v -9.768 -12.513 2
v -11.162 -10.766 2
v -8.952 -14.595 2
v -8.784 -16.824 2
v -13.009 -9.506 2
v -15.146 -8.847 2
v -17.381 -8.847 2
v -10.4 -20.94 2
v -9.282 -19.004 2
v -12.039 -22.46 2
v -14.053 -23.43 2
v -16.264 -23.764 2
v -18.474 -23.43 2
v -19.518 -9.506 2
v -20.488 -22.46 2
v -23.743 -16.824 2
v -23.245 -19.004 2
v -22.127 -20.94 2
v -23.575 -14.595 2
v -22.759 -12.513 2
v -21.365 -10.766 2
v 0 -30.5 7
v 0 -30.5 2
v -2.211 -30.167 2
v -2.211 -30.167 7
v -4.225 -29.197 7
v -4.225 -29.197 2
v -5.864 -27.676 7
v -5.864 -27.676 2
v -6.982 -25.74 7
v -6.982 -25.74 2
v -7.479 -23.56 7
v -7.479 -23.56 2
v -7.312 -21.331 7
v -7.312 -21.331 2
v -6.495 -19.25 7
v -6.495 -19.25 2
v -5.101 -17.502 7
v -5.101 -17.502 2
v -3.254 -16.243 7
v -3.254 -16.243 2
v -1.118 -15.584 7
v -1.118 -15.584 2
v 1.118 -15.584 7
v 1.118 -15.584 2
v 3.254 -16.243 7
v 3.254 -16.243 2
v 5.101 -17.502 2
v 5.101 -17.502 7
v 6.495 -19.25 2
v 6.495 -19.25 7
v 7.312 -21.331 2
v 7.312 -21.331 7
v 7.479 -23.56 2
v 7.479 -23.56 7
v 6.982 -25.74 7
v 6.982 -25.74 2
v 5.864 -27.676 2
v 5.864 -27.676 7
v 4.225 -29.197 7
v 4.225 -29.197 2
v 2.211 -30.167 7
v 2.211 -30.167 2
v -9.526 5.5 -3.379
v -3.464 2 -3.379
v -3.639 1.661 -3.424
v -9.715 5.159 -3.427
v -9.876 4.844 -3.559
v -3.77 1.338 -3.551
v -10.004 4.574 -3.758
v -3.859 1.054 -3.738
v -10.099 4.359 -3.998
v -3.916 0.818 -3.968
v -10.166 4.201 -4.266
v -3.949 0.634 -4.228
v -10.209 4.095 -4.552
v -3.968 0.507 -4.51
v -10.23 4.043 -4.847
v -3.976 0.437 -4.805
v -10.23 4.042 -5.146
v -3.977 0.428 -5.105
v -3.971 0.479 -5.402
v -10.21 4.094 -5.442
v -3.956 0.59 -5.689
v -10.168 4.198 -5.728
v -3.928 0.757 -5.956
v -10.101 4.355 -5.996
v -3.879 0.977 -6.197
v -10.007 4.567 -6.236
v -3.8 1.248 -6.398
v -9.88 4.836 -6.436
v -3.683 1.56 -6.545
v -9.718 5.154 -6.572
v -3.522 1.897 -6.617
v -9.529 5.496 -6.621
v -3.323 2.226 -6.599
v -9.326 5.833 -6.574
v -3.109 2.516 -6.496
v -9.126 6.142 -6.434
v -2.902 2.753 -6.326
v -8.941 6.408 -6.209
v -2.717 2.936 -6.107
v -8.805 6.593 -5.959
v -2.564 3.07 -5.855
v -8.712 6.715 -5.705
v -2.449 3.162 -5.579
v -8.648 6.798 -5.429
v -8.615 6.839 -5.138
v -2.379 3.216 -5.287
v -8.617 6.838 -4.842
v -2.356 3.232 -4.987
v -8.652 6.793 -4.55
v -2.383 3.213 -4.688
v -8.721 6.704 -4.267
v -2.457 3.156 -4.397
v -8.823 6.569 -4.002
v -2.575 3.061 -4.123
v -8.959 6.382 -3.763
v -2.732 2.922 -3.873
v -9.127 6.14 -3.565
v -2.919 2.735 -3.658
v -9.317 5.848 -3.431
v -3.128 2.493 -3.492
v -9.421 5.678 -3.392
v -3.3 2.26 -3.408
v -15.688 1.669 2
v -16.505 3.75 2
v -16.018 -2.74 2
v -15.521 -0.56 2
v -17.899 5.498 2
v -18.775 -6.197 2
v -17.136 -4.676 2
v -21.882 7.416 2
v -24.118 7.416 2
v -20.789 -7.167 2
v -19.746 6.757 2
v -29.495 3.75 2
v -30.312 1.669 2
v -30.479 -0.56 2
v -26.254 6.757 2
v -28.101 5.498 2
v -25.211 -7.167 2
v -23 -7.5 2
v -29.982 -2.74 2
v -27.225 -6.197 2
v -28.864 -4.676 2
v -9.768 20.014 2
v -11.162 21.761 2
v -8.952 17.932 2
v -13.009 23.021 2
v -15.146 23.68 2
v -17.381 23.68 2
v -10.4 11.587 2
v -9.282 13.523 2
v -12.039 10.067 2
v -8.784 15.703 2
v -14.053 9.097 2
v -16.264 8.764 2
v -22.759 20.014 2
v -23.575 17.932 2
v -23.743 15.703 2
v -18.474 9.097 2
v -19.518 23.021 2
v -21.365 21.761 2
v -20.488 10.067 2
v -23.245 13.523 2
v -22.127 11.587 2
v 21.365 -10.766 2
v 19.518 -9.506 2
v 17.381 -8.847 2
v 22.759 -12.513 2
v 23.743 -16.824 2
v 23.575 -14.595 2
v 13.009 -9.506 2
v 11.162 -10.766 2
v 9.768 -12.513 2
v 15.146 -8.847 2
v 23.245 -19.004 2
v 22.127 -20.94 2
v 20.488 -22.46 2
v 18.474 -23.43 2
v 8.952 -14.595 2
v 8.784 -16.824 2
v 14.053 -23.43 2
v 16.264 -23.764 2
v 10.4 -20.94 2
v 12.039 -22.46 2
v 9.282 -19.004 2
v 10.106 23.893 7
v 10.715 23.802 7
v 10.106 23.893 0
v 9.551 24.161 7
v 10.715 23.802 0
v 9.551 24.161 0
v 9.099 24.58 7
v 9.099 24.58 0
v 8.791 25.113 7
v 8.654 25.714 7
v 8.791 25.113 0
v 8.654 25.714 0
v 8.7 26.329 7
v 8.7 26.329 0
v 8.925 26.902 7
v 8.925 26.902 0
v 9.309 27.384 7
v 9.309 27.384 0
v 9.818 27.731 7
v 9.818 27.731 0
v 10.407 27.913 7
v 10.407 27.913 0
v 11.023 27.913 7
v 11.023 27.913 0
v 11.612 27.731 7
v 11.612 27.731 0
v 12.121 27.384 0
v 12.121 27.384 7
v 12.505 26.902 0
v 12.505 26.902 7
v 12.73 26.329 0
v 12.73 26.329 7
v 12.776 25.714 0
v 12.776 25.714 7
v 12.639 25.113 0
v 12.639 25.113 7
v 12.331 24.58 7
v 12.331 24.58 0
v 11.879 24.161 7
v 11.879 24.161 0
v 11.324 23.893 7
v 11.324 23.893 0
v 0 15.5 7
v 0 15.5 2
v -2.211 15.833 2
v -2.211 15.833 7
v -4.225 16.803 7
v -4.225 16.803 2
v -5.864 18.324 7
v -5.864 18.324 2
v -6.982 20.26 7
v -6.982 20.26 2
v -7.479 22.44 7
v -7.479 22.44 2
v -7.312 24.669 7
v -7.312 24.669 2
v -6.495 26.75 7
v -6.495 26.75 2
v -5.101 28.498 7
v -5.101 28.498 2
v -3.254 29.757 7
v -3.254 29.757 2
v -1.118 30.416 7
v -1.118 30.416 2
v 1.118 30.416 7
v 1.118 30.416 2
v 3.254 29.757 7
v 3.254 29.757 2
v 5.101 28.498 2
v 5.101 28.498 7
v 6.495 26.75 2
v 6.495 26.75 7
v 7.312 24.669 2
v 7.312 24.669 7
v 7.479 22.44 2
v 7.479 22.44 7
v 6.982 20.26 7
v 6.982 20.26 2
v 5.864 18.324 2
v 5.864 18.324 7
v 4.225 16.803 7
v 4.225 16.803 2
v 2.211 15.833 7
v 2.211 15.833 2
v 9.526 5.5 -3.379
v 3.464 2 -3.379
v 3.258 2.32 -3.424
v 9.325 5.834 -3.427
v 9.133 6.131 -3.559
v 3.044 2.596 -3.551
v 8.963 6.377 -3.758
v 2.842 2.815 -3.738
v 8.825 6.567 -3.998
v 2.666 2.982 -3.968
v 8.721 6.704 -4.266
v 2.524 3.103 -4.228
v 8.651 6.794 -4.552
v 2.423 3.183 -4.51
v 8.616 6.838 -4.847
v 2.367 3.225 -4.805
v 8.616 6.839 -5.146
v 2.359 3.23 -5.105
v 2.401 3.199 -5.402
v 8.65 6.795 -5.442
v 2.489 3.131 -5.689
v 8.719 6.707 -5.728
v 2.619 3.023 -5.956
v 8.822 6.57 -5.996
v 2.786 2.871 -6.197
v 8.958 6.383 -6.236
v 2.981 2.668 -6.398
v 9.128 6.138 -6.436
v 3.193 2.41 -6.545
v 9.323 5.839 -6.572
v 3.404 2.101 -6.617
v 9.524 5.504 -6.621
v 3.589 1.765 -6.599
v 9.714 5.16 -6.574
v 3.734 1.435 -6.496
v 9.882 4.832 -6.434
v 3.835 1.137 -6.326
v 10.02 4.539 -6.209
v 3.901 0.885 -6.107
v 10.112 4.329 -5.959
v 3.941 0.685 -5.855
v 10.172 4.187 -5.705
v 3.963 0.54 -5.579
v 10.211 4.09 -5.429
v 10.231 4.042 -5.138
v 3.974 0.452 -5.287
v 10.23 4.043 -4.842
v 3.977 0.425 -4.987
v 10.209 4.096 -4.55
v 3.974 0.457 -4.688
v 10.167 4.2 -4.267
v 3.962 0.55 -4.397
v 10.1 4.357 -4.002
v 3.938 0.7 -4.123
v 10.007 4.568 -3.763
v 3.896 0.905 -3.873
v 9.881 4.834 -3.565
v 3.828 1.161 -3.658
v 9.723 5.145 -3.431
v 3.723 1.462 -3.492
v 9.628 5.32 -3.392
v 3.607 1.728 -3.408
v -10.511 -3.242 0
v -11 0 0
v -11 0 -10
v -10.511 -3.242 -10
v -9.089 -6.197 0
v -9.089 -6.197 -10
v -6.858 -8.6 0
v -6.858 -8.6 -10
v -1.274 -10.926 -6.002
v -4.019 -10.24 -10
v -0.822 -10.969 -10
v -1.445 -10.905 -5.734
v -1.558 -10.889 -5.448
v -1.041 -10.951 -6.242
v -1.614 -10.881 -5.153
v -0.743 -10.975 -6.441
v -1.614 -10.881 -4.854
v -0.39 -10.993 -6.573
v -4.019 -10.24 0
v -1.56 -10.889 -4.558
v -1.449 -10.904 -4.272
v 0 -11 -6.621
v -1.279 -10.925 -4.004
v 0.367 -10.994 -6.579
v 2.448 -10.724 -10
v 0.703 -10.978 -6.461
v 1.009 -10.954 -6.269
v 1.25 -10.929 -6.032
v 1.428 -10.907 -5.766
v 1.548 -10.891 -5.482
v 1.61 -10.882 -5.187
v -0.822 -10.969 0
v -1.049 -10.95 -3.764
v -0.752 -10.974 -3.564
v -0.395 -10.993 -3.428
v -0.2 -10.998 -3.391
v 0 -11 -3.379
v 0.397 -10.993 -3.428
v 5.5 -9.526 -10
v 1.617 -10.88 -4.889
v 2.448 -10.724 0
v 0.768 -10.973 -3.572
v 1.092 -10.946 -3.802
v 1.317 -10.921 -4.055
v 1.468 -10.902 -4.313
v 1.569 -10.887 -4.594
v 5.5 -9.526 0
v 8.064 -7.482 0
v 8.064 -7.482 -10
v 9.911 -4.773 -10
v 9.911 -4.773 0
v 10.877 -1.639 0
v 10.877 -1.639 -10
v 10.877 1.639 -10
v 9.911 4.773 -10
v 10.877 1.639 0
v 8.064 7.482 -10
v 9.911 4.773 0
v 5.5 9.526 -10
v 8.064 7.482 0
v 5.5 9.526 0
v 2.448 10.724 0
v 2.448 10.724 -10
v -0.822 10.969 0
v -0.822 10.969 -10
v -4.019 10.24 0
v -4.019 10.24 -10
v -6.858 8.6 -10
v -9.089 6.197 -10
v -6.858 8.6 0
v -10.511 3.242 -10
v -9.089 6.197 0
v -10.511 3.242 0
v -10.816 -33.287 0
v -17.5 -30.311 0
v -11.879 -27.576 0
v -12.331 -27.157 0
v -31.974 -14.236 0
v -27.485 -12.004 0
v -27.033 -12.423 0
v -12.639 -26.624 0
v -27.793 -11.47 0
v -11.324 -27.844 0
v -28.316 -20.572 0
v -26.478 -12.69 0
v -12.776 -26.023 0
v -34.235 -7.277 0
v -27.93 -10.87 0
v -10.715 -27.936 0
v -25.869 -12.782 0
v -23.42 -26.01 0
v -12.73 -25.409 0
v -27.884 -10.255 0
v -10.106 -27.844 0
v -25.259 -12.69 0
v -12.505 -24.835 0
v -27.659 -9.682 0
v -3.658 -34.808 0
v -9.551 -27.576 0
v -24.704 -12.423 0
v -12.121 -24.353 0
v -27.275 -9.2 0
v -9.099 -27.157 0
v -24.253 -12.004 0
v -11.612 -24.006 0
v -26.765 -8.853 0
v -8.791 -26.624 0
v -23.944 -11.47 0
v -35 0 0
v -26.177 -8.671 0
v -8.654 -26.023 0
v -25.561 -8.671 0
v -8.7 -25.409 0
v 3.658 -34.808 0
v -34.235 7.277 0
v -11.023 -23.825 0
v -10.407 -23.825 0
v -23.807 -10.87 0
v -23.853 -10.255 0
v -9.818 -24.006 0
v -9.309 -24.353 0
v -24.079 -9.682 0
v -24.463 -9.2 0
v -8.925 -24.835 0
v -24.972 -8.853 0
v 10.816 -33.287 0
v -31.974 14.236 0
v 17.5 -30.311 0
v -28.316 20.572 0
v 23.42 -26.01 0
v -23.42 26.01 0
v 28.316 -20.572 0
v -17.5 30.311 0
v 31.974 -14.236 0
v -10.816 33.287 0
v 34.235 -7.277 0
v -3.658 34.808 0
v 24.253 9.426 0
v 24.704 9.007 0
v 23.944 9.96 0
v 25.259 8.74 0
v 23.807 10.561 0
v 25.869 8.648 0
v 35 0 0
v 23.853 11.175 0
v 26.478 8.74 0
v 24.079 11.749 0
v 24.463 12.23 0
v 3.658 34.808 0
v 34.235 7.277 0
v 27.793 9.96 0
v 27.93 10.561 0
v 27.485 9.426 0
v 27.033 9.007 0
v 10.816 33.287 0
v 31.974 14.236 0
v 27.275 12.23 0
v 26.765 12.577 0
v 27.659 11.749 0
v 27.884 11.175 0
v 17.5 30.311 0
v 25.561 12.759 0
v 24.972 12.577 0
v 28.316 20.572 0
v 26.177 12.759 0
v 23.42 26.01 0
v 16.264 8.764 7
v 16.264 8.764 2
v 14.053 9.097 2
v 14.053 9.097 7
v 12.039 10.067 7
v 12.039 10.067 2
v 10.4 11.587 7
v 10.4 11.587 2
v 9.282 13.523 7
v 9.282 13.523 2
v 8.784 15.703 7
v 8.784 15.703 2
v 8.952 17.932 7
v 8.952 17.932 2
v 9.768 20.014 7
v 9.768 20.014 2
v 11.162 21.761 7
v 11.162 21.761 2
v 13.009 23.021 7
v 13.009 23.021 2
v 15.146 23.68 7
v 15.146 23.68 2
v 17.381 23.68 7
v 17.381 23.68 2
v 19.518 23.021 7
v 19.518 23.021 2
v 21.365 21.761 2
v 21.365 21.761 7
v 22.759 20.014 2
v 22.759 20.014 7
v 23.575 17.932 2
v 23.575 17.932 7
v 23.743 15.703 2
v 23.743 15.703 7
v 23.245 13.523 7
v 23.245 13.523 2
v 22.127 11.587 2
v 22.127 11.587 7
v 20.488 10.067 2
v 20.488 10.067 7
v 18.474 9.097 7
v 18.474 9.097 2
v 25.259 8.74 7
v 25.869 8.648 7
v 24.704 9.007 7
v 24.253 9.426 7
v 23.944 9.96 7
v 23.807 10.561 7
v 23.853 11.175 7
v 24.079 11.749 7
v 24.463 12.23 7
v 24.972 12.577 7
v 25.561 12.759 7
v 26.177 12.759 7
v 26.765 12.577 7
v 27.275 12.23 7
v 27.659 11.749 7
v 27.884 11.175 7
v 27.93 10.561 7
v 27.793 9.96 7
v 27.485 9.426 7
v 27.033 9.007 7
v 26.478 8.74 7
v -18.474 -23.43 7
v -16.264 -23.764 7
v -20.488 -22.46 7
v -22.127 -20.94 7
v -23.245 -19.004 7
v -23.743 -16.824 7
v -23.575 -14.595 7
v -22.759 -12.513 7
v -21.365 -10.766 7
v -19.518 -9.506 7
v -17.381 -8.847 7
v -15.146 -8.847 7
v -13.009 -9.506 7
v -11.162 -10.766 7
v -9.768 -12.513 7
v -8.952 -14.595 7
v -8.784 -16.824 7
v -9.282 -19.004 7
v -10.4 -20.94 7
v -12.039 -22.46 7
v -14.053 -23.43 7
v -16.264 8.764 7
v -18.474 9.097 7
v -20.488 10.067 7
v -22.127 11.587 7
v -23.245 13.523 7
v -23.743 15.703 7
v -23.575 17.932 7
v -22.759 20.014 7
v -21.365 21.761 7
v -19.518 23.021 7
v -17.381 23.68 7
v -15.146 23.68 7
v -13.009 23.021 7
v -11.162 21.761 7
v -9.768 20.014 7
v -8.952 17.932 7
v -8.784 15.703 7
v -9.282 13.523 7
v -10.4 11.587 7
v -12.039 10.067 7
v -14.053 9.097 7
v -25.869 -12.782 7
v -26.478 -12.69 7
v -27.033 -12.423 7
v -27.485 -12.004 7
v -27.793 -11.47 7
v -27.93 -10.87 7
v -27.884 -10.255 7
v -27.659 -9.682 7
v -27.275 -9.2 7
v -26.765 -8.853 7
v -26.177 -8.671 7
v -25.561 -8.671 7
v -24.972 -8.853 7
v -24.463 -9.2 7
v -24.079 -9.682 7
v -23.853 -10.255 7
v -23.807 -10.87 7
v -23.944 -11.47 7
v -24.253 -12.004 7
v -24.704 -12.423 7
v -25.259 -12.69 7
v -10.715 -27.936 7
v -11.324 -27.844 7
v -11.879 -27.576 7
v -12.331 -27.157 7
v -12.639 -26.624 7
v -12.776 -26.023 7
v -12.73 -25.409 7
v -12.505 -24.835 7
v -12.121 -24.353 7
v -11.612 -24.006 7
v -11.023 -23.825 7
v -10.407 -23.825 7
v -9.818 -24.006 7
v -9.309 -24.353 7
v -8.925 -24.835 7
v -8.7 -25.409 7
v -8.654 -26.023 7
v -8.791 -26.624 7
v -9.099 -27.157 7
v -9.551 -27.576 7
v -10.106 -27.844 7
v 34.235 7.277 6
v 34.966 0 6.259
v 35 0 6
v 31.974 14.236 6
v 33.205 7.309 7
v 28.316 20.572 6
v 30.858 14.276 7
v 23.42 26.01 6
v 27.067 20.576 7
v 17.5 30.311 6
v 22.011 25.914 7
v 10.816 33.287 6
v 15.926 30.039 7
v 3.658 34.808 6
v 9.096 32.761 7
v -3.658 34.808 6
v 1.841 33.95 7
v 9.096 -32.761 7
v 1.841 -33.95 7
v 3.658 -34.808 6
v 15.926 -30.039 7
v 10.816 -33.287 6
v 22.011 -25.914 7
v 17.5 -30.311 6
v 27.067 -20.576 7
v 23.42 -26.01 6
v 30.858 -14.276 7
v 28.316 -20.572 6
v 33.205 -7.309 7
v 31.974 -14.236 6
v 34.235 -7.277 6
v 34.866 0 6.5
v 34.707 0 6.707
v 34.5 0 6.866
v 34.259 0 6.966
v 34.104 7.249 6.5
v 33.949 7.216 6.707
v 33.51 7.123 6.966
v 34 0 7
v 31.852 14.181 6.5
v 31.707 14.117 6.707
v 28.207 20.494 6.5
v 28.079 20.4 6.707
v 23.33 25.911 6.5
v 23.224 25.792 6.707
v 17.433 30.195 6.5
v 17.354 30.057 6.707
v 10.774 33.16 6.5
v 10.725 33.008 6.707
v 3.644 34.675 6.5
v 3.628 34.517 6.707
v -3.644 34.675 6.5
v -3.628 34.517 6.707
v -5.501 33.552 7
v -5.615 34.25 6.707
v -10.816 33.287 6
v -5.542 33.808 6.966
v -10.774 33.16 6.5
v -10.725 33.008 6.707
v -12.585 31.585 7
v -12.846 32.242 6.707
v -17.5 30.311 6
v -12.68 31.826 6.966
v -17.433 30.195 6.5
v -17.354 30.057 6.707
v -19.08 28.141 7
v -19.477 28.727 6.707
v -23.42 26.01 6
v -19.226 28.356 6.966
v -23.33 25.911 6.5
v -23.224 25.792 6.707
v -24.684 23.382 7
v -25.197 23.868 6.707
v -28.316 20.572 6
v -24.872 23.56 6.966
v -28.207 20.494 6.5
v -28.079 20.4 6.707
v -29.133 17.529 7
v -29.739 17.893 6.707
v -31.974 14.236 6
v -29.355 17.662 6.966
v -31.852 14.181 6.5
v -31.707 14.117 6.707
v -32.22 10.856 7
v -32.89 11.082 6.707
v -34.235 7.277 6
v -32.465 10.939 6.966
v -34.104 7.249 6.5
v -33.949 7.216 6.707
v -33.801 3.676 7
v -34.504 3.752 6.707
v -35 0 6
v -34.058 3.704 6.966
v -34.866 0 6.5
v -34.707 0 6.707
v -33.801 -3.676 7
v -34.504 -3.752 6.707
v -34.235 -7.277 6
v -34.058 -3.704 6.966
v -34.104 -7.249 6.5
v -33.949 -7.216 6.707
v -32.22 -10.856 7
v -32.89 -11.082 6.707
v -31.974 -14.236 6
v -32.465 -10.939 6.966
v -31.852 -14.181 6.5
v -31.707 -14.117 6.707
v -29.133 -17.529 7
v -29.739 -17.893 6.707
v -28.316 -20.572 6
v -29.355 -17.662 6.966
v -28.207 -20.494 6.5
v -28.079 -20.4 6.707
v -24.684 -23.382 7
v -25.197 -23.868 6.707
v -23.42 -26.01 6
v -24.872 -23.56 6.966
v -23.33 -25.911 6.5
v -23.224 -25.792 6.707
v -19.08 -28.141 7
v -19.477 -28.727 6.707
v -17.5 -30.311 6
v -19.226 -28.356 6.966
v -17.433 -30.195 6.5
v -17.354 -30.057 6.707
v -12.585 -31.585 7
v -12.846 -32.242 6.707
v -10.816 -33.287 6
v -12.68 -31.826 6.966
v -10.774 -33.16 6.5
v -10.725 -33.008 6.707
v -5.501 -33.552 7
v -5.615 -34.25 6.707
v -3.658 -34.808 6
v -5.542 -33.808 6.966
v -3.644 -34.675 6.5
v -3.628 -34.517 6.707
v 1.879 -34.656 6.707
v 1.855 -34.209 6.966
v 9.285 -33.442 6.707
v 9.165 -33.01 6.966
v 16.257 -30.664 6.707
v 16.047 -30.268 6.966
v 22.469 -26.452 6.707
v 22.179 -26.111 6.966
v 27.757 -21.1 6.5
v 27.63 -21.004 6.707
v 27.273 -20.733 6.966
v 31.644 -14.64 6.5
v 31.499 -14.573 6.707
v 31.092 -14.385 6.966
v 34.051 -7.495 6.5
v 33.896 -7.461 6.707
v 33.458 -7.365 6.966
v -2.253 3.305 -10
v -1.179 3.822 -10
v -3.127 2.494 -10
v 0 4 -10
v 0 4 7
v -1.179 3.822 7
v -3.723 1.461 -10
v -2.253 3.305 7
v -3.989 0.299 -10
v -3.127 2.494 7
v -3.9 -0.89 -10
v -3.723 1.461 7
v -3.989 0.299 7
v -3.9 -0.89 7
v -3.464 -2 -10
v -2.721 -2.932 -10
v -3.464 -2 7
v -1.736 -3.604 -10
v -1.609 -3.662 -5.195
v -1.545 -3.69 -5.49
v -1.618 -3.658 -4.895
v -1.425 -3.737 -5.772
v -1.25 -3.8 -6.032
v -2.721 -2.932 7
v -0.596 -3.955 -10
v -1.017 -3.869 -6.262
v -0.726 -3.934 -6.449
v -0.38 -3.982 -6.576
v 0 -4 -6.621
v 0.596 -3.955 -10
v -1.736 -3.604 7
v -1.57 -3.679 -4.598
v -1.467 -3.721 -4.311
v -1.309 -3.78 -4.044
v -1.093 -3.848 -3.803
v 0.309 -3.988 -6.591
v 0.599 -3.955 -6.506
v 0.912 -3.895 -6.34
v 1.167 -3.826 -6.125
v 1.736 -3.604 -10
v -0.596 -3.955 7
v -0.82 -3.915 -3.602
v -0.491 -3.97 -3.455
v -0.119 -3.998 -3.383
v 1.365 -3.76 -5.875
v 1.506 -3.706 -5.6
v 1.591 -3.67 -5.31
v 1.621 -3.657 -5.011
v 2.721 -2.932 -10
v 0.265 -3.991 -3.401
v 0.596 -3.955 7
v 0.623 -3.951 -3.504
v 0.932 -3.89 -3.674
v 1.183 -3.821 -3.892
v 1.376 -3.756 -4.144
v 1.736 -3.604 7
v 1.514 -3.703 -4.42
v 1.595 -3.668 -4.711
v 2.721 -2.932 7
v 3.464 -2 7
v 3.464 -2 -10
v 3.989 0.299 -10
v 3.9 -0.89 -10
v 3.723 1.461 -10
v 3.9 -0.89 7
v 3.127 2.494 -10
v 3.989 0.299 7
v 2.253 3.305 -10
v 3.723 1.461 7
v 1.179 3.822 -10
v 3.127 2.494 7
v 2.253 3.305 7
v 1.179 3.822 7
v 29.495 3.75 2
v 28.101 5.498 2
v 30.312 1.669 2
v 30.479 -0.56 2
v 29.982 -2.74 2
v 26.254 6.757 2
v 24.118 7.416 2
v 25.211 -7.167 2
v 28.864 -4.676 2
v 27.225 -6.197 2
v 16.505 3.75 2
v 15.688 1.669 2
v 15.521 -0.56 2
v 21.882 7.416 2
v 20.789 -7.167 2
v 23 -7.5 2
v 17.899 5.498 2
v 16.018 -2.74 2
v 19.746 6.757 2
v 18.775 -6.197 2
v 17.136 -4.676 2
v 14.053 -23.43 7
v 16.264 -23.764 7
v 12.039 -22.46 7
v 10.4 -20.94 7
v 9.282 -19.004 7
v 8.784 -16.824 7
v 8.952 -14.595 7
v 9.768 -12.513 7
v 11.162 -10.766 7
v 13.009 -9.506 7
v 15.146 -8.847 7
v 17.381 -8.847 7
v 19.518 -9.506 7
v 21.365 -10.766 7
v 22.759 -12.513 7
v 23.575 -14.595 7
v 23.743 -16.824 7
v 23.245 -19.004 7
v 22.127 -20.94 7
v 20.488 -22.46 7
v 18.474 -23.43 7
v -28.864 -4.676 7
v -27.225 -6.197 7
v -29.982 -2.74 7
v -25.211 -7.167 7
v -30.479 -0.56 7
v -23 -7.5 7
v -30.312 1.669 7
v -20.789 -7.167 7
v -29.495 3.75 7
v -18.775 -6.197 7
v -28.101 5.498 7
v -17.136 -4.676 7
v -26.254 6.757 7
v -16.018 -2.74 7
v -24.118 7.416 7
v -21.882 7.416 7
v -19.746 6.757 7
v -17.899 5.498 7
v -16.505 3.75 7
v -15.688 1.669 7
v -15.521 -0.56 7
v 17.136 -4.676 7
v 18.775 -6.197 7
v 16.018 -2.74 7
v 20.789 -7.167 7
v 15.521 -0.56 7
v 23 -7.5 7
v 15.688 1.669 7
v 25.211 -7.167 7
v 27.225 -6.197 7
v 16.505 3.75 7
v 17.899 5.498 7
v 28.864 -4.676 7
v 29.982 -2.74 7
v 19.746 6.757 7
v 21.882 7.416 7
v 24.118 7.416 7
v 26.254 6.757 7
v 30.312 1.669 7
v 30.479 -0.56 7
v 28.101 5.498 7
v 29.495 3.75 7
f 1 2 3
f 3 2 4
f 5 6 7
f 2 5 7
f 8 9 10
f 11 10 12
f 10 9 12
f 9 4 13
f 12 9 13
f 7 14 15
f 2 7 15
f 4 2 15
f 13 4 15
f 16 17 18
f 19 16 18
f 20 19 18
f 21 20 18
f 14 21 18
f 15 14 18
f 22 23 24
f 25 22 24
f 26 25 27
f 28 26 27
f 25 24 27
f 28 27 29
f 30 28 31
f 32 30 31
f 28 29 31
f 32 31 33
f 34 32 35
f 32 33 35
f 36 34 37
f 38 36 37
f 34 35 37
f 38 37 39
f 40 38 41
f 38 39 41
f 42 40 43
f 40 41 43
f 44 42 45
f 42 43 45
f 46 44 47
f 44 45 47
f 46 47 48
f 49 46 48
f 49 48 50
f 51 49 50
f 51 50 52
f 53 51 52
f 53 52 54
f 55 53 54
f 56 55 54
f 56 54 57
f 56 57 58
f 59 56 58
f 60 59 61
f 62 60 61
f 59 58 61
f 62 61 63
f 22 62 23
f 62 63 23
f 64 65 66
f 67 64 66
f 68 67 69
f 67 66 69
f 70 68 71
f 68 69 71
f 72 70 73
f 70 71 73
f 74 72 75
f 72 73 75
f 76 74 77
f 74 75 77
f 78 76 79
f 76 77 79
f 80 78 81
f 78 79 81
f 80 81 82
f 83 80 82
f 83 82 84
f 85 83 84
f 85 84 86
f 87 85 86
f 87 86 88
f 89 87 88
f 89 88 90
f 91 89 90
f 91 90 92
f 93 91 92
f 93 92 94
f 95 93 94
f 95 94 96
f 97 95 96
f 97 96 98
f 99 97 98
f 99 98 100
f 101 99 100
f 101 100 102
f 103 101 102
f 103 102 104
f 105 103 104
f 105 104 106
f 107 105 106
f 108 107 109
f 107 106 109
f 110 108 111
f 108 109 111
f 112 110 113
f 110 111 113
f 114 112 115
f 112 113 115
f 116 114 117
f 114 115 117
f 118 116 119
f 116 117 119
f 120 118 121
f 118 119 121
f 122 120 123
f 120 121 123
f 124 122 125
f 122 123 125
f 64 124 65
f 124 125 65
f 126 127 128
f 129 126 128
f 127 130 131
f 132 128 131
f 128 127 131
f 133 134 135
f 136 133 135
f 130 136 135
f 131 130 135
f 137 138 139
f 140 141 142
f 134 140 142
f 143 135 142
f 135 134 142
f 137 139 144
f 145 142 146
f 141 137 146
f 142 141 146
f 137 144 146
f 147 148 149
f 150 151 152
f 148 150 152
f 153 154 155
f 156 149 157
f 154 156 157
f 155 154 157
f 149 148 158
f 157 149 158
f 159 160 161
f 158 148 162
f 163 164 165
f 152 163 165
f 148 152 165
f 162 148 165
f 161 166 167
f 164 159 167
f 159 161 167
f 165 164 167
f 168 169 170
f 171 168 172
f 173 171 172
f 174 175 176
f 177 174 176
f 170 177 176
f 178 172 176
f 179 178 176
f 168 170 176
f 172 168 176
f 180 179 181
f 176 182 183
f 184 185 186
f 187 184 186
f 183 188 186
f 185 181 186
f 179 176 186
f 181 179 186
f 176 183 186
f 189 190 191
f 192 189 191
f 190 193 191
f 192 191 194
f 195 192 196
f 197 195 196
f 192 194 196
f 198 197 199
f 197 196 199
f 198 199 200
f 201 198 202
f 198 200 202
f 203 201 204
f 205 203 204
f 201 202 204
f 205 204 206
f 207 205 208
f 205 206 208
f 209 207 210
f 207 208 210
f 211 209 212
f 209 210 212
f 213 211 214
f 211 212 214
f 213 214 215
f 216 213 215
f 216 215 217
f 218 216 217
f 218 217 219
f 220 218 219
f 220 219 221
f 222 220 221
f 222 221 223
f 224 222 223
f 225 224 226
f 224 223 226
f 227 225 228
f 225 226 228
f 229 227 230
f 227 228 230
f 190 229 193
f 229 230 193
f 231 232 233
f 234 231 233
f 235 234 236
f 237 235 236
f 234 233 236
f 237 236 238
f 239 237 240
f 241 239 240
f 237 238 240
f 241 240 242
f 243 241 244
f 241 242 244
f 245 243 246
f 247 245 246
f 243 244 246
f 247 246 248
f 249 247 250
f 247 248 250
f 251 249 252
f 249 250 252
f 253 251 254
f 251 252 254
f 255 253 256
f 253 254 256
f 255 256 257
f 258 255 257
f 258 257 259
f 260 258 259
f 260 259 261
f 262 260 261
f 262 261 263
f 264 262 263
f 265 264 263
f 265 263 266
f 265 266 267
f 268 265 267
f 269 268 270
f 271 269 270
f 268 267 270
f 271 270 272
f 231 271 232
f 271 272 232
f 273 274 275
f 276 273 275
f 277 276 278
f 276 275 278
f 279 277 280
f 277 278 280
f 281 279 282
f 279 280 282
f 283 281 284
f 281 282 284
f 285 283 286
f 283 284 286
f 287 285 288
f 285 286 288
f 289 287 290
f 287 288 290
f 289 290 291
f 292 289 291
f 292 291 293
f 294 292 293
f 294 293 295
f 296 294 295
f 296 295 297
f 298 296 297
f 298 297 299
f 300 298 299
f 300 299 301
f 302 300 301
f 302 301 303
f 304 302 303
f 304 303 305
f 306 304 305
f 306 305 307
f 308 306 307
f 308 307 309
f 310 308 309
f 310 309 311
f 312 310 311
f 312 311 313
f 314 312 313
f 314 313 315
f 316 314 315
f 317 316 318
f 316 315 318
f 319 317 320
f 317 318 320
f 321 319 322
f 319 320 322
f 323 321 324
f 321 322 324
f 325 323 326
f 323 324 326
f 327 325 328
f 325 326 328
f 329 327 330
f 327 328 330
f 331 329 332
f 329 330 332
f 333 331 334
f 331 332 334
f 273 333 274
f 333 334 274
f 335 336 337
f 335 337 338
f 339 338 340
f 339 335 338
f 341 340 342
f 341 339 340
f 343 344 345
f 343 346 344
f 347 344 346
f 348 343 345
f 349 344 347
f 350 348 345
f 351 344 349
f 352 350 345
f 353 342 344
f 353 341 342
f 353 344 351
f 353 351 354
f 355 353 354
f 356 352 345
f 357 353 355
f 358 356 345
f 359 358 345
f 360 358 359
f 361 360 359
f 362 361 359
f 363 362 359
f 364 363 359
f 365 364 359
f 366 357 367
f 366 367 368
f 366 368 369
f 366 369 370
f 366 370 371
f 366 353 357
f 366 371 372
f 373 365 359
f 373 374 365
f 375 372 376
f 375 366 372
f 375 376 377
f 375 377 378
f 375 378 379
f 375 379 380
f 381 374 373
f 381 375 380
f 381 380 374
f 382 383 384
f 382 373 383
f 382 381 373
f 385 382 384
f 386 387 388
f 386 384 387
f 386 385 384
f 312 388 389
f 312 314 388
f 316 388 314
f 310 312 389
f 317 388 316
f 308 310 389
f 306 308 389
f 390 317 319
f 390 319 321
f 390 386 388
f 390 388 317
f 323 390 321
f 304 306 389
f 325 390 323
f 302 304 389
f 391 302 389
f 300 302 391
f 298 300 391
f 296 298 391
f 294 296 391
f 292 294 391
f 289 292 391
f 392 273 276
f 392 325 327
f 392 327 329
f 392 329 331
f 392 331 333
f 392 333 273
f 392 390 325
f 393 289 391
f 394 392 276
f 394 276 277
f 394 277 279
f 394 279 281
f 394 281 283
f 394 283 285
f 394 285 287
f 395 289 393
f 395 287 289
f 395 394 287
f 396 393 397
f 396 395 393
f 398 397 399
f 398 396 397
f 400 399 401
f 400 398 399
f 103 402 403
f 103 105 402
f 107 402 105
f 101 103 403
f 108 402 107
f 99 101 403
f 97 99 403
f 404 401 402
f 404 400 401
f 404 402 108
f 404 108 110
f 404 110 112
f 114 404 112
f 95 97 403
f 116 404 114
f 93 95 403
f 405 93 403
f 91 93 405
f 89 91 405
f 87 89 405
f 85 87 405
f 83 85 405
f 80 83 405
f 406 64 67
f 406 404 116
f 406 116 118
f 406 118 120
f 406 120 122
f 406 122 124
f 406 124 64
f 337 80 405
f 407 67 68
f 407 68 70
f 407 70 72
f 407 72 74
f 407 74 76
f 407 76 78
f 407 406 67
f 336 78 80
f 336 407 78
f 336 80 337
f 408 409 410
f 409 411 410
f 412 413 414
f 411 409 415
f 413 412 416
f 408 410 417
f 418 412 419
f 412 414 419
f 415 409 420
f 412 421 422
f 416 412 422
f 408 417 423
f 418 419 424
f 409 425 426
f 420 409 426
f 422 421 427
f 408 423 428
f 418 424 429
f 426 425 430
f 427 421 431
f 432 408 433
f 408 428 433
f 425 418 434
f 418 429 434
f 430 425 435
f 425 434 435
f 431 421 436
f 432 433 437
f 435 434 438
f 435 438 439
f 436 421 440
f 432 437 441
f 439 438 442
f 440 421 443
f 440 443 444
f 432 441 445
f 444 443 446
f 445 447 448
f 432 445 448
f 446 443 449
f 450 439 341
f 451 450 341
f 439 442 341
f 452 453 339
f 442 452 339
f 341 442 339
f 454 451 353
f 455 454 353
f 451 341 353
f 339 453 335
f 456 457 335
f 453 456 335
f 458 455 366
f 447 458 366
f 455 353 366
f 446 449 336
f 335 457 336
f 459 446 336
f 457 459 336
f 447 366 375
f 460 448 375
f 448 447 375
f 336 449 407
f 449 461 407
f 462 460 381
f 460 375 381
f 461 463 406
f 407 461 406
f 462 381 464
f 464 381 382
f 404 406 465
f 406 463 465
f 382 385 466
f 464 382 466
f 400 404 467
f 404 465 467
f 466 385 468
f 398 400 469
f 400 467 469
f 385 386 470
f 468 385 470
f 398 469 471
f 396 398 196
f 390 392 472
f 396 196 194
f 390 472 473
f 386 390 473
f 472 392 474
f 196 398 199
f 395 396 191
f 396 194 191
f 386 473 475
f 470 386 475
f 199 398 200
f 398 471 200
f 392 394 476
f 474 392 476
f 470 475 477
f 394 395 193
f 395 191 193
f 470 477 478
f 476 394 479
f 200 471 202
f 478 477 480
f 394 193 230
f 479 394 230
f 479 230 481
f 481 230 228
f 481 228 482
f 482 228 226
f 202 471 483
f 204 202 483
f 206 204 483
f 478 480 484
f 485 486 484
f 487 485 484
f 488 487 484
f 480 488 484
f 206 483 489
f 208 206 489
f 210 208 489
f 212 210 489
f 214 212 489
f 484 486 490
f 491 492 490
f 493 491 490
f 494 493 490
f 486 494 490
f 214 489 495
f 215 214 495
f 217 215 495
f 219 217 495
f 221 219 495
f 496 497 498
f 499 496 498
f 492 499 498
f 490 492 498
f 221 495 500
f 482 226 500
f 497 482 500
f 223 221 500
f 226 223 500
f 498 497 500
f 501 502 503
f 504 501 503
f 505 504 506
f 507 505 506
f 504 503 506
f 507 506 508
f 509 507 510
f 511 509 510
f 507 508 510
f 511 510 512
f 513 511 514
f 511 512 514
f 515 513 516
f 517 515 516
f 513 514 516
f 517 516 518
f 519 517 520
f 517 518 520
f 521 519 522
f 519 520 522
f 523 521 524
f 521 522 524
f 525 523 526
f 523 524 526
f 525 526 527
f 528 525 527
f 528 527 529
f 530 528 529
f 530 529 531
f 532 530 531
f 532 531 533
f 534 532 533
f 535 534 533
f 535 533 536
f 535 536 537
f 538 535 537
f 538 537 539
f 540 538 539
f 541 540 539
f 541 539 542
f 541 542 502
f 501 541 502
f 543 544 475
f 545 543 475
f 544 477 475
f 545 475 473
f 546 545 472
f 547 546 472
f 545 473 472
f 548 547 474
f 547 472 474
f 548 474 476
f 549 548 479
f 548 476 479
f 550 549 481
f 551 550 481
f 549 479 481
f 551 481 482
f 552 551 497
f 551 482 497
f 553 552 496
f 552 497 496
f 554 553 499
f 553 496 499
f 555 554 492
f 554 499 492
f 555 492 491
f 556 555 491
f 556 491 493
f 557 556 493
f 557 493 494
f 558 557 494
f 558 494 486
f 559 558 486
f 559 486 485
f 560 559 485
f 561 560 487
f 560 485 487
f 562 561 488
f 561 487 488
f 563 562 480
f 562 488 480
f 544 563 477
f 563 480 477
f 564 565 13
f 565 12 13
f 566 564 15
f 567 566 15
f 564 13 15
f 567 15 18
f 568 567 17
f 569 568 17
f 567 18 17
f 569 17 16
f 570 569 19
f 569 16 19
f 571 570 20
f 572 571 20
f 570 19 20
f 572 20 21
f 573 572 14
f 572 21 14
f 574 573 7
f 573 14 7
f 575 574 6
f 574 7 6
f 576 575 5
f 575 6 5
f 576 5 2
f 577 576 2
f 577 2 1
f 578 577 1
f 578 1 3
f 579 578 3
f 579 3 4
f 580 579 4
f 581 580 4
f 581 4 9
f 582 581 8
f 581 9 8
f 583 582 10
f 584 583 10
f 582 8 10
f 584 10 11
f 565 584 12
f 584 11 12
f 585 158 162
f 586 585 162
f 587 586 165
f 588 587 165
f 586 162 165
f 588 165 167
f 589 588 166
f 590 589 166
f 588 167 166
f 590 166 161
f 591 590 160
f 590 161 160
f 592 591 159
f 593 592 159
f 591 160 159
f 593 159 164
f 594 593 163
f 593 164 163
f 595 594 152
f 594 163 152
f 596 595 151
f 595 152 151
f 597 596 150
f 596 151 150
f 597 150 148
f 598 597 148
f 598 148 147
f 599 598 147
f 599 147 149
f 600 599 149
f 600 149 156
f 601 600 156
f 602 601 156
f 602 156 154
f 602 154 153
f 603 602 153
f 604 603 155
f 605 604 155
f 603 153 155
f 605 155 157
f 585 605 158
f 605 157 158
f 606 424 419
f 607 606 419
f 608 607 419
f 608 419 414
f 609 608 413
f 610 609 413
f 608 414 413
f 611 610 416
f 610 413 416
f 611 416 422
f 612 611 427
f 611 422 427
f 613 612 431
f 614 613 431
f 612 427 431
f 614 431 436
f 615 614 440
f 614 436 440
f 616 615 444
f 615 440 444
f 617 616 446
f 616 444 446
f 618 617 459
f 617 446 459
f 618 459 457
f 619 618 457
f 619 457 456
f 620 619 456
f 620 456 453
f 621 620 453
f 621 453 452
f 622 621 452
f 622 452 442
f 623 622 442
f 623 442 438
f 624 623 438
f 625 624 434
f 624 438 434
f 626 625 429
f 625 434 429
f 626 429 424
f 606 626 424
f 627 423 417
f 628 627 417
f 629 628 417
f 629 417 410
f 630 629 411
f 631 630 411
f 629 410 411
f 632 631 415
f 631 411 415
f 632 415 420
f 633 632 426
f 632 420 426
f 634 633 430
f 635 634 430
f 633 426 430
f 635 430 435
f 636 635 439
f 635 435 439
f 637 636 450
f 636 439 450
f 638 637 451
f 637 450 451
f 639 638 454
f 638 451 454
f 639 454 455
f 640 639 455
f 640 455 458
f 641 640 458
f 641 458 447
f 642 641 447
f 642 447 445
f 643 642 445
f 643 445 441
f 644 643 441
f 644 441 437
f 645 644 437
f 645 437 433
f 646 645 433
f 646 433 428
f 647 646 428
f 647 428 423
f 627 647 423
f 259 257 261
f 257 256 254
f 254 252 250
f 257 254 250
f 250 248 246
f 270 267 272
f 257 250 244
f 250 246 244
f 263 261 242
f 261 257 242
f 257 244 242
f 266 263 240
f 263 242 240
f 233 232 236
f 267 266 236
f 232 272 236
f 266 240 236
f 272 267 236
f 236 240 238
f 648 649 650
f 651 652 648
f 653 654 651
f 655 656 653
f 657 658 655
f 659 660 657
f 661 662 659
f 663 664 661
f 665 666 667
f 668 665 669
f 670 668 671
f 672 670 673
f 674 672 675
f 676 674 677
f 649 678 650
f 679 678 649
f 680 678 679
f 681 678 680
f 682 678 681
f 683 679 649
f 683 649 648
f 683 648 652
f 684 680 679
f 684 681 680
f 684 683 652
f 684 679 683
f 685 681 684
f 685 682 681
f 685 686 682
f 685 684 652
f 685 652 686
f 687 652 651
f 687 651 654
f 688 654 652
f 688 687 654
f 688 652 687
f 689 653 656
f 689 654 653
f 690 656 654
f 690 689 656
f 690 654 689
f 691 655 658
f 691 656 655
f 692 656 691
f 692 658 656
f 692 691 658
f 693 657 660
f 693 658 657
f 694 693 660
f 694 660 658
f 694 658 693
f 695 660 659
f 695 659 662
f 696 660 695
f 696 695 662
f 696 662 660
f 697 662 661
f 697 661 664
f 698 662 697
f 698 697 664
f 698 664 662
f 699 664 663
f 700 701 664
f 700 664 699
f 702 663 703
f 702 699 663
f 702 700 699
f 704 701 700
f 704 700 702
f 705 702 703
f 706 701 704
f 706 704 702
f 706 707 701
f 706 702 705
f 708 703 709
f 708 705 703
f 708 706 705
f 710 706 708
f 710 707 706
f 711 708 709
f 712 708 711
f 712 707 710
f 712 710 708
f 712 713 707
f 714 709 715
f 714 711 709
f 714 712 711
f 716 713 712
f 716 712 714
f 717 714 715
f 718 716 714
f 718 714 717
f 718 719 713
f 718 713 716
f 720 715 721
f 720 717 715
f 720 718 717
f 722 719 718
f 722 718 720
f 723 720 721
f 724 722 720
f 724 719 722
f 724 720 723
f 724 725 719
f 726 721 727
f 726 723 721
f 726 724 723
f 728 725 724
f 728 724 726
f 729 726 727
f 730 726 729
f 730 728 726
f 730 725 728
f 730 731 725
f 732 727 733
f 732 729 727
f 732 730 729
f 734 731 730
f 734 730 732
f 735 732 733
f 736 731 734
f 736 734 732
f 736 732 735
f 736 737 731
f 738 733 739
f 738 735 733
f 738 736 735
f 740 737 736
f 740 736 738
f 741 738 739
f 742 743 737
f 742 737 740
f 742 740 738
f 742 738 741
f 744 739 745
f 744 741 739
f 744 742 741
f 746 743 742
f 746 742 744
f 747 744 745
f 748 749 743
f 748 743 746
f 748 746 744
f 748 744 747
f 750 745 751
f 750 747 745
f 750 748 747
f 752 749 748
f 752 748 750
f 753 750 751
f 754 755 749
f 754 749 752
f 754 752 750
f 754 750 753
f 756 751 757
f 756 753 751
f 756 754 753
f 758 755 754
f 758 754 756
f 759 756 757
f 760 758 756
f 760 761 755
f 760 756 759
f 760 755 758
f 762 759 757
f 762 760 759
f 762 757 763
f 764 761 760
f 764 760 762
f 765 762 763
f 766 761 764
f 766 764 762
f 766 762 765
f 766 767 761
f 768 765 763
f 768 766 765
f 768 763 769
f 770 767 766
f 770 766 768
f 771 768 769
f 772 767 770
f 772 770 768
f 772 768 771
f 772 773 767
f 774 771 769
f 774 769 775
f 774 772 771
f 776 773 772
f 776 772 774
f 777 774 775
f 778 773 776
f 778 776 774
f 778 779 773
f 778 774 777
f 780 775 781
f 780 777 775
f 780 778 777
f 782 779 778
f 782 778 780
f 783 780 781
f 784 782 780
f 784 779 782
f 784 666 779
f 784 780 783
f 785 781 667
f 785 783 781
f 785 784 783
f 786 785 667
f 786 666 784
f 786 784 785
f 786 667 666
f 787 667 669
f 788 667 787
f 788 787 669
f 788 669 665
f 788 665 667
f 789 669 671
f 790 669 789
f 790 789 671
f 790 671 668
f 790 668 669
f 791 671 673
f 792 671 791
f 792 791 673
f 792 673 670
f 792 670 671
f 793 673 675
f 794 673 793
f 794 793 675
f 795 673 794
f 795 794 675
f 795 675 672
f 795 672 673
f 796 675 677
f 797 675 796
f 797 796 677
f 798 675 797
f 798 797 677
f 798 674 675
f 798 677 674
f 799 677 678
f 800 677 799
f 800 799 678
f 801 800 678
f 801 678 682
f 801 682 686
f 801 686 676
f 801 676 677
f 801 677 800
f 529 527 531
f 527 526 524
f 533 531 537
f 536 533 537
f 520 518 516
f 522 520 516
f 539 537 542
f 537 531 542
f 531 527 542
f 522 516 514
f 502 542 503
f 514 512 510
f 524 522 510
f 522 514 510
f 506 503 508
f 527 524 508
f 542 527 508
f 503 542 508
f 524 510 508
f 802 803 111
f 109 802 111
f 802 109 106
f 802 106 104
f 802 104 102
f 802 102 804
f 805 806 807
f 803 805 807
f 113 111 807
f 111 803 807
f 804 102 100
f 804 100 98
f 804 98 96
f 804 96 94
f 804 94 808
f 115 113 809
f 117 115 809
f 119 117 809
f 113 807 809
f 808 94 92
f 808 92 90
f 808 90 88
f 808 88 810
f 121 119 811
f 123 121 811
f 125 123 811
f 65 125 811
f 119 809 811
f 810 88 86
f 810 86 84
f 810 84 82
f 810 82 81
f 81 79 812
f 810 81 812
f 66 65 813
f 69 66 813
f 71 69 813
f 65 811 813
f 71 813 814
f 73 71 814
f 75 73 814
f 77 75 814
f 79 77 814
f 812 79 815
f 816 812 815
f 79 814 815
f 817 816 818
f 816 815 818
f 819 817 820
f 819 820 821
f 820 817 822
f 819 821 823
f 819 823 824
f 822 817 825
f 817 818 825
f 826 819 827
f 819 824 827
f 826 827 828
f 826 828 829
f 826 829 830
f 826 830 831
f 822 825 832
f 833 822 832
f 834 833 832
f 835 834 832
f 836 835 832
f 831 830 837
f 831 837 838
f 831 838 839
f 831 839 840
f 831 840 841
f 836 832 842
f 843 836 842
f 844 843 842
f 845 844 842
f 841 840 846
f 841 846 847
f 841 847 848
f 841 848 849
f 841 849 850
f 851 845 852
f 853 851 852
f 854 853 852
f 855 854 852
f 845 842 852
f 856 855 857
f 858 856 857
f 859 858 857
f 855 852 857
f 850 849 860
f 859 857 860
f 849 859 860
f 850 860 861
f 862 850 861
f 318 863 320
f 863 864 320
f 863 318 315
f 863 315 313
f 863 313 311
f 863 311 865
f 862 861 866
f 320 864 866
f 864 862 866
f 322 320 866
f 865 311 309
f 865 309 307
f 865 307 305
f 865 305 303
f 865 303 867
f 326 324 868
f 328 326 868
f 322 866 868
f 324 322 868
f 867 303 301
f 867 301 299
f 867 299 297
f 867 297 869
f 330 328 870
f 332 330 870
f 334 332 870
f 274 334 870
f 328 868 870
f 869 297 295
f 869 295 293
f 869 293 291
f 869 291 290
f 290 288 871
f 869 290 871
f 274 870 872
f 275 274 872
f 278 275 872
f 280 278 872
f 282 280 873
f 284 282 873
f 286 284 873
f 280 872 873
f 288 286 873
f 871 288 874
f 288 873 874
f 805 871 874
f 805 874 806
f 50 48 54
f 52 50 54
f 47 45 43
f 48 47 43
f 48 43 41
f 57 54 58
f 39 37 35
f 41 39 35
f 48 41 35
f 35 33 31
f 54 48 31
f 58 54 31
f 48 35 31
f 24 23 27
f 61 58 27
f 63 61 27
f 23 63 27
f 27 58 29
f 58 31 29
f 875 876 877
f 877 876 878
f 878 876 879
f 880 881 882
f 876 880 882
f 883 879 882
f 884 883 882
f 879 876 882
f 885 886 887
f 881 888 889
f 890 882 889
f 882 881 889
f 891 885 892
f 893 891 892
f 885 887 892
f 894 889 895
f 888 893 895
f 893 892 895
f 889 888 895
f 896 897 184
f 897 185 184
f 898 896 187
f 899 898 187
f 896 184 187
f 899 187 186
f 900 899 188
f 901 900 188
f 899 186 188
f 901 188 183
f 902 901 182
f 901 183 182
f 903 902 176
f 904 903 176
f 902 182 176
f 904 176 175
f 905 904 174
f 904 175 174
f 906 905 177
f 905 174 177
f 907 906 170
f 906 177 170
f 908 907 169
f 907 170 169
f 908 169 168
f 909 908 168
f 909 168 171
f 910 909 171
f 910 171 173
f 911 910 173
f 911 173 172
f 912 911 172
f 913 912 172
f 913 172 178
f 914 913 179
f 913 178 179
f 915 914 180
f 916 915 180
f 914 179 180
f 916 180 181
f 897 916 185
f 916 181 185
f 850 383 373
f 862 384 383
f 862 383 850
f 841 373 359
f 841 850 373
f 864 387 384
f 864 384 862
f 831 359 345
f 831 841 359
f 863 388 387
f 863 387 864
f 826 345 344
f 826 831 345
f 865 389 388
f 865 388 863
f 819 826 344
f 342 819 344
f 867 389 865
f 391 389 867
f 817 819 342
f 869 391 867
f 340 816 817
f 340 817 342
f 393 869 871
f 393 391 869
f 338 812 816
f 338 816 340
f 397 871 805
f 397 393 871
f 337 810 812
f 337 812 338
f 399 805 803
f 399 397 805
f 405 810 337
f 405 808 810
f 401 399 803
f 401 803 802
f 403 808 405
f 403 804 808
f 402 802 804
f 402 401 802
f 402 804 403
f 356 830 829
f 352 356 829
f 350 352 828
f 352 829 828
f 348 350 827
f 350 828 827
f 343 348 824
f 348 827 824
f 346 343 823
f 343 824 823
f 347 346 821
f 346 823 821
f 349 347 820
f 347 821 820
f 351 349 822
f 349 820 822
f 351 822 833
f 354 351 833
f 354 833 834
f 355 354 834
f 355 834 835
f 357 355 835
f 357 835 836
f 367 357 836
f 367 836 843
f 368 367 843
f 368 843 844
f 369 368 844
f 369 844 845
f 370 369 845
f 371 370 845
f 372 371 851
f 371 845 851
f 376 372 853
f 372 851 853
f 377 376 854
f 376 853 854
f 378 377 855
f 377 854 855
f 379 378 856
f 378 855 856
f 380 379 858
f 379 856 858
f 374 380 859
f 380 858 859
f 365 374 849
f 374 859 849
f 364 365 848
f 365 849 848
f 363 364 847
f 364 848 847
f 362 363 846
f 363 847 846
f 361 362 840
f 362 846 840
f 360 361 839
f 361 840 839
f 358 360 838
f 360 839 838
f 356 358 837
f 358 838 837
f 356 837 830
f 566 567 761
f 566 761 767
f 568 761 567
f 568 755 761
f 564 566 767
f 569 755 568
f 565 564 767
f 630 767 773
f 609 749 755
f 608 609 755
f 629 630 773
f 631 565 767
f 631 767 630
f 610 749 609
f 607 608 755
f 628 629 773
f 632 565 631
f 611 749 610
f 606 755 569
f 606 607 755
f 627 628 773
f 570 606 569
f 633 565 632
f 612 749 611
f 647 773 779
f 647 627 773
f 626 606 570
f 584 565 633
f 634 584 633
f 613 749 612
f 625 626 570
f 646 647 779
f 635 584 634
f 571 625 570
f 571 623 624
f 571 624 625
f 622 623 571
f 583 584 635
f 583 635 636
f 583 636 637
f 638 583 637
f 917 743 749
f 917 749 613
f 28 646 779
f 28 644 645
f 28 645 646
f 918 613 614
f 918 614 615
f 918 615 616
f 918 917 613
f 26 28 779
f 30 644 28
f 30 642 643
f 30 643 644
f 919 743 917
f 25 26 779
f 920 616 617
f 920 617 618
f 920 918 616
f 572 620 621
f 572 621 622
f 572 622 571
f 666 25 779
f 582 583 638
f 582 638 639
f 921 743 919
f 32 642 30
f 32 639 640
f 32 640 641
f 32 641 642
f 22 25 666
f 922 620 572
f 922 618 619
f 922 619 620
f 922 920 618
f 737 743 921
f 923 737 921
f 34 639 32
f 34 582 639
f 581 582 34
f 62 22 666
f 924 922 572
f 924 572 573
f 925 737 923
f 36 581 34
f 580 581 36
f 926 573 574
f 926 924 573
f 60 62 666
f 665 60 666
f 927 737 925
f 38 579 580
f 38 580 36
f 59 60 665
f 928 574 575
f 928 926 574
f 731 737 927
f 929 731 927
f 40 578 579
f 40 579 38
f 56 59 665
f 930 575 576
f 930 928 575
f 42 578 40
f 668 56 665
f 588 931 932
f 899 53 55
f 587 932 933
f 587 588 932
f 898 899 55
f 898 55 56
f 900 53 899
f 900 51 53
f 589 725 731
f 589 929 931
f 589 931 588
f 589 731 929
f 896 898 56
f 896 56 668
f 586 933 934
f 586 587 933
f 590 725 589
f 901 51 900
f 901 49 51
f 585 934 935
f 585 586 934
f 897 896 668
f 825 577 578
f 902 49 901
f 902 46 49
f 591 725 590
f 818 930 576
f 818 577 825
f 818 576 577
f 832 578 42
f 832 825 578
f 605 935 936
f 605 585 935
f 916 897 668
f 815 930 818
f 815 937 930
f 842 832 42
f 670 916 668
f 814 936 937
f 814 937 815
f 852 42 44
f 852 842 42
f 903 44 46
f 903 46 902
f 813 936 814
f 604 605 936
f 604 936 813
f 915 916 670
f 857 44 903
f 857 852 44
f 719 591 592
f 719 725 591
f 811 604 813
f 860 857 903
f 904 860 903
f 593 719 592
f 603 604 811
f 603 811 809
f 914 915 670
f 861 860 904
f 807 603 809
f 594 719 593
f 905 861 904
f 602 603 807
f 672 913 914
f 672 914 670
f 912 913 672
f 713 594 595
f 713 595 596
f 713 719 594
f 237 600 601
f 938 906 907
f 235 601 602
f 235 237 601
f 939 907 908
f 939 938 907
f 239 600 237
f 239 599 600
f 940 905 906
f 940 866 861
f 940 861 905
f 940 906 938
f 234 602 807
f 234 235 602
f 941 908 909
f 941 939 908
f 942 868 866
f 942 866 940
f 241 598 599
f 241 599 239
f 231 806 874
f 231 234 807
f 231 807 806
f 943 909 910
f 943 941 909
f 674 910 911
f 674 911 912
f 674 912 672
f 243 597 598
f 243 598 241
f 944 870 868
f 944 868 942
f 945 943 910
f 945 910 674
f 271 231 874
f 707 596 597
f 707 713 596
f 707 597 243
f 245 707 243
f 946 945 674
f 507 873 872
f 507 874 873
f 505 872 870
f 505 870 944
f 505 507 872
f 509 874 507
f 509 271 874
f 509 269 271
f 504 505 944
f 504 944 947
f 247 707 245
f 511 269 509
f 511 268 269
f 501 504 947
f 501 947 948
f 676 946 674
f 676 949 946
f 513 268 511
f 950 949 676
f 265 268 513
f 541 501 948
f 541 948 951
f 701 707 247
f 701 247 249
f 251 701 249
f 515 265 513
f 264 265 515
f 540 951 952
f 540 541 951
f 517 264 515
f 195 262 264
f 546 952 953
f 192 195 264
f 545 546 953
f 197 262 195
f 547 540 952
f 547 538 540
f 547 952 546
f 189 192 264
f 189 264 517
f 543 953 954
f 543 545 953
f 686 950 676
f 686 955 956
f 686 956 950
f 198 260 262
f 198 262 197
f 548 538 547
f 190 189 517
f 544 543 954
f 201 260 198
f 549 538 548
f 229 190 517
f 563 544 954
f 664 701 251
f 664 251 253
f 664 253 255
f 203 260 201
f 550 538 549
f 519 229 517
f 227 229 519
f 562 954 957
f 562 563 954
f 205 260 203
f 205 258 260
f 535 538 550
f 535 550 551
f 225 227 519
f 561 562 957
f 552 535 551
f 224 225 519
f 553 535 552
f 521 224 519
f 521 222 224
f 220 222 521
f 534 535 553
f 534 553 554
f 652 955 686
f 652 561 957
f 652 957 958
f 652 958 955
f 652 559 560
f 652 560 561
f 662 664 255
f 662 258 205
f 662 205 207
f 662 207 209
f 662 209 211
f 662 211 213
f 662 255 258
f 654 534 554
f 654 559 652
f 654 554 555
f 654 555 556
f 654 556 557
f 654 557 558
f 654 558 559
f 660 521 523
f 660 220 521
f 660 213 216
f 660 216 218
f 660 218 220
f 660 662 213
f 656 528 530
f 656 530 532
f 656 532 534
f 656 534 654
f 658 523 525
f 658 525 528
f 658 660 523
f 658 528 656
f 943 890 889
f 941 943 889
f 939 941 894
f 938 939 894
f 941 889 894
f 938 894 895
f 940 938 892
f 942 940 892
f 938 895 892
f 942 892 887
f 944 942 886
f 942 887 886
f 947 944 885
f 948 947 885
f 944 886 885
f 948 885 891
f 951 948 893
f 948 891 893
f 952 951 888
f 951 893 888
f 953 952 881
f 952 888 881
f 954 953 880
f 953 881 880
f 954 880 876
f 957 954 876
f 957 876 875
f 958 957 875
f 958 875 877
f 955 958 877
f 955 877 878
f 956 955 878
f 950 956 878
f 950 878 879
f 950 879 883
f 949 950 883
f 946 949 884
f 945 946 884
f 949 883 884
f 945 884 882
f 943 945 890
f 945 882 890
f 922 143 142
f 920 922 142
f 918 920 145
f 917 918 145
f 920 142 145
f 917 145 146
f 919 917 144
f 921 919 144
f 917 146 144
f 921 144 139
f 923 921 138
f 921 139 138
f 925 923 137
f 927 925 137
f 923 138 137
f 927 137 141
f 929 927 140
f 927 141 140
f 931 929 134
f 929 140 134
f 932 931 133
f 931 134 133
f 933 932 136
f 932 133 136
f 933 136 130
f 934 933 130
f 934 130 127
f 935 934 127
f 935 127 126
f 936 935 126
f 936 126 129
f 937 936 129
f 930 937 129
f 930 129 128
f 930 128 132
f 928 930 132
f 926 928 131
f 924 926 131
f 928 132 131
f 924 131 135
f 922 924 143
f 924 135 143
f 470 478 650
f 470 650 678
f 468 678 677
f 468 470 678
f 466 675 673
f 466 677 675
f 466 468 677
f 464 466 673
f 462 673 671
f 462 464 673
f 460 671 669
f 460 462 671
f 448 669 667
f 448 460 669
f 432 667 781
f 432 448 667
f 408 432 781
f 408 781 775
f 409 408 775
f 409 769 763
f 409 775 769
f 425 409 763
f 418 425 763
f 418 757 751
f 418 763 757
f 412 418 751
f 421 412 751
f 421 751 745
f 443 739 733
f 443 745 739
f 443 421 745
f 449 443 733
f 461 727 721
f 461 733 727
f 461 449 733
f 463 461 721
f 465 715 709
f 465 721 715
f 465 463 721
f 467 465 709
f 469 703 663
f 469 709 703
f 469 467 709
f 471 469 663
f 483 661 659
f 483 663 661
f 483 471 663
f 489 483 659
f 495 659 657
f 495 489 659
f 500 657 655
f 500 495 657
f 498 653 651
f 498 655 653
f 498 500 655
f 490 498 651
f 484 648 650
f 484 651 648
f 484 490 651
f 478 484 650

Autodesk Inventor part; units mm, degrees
sketch "Sketch1" plane through (0, 0, 0) normal (0, 0, 1) x (1, 0, 0)
  circle A0 centre (0, 0) radius 35
  dimension "d0" = 70
extrude "Extrusion1" add sketch "Sketch1" along normal blind 7
sketch "Sketch2" plane through (0, 0, 7) normal (0, 0, 1) x (1, 0, 0)
  circle A0 centre (0, 0) radius 35 projected
  circle A1 centre (0, 0) radius 23 construction
  line L0 (0, 0) -> (0, 23) construction
  point P0 (-16.2635, 16.2635)
  point P1 (-23, 0)
  point P2 (-16.2635, -16.2635)
  point P3 (0, -23)
  point P4 (16.2635, -16.2635)
  point P5 (23, 0)
  point P6 (16.2635, 16.2635)
  dimension "d3" = 46
  dimension "d6" = 360
hole "Hole1" at (0, 23, 7) at (-16.2635, 16.2635, 7) at (-23, 0, 7) at (-16.2635, -16.2635, 7) at (0, -23, 7) at (16.2635, -16.2635, 7) at (23, 0, 7) at (16.2635, 16.2635, 7) direction (0, 0, -1) diameter 15 depth 5
fillet "Fillet2" radius 1 1 edges at (-35, 0, 7)
sketch "Sketch12" plane through (0, 0, 0) normal (0, 0, -1) x (-1, 0, 0)
  circle A0 centre (0, 0) radius 35 projected
  circle A1 centre (0, 0) radius 11
  dimension "d62" = 22
extrude "Extrusion4" add sketch "Sketch12" along normal blind 10 contours A1
sketch "Sketch13" plane through (0, 0, -10) normal (0, 0, -1) x (-1, 0, 0)
  point P0 (0, 0)
  point P1 (0, 0)
hole "Hole6" at (0, 0, -10) direction (0, 0, 1) diameter 8 end through all
sketch "Sketch14" plane through (0, 0, 7) normal (0, 0, 1) x (1, 0, 0)
  circle A0 centre (0, 0) radius 28 construction
  circle A1 centre (0, 0) radius 4 projected
  circle A2 centre (16.2635, 16.2635) radius 7.5 projected
  circle A3 centre (16.2635, -16.2635) radius 7.5 projected
  circle A4 centre (-16.2635, -16.2635) radius 7.5 projected
  circle A5 centre (-16.2635, 16.2635) radius 7.5 projected
  circle A6 centre (0, 23) radius 7.5 projected
  circle A7 centre (-23, 0) radius 7.5 projected
  circle A8 centre (0, -23) radius 7.5 projected
  circle A9 centre (23, 0) radius 7.5 projected
  circle A10 centre (0, 0) radius 34 projected
  circle A11 centre (0, 0) radius 4 projected
  line L0 (0, 0) -> (16.2635, 16.2635)
  line L1 (0, 0) -> (10.7151, 25.8686)
  line L2 (25.8686, 10.7151) -> (0, 0)
  line L3 (16.2635, -16.2635) -> (-16.2635, 16.2635)
  point P0 (-25.8686, -10.7151)
  point P1 (-10.7151, -25.8686)
  dimension "d72" = 56
  dimension "d73" = 22.5
  dimension "d74" = 22.5
hole "Hole7" at (25.8686, 10.7151, 7) at (10.7151, 25.8686, 7) at (-10.7151, -25.8686, 7) at (-25.8686, -10.7151, 7) direction (0, 0, -1) diameter 4.134 end through all thread size "M5x0.8" class "6H" standard "ANSI Metric M Profile"
ref_plane "Work Plane1" through (0, -11, 0) normal (0, 1, 0) x (-1, 0, 0)
sketch "Sketch15" plane through (0, -11, 0) normal (0, 1, 0) x (-1, 0, 0)
  line L0 (-11, -10) -> (11, -10) projected
  line L1 (11, 0) -> (-11, 0) projected
  line L2 (-11, 0) -> (-11, -10) projected
  line L3 (11, 0) -> (-11, 0)
  line L4 (-11, 0) -> (-11, -3)
  line L5 (-11, -3) -> (11, -3)
  line L6 (11, -3) -> (11, 0)
  point P0 (0, 0)
  point P1 (0, -5)
  dimension "d82" = 3
  dimension "d83" = 11
  dimension "d84" = 5
hole "Hole8" at (0, -11, -5) direction (0, 1, 0) diameter 3.242 depth 11.05 tip angle 118 thread size "M4x0.7" class "6H" standard "ANSI Metric M Profile"
sketch "Sketch16" plane through (0, 0, -10) normal (0, 0, -1) x (-1, 0, 0)
  circle A0 centre (0, 0) radius 4 projected
  circle A1 centre (0, 0) radius 11 projected
  line L0 (0, 0) -> (0, -11)
  circle A2 centre (0, 0) radius 11 projected
  line L1 (0, 0) -> (-9.5263, 5.5)
  line L2 (0, 0) -> (9.5263, 5.5)
  dimension "d92" = 120
  dimension "d93" = 120
ref_plane "Work Plane2" through (9.5263, 5.5, -10) normal (0.866, 0.5, 0) x (-0.5, 0.866, 0)
ref_plane "Work Plane3" through (-9.5263, 5.5, -10) normal (-0.866, 0.5, 0) x (-0.5, -0.866, 0)
sketch "Sketch17" plane through (9.5263, 5.5, -10) normal (0.866, 0.5, 0) x (-0.5, 0.866, 0)
  line L0 (35, 10) -> (-35, 10) projected
  line L1 (35, 16) -> (-35, 16) projected
  line L2 (-11, 0) -> (11, 0) projected
  line L3 (11, 10) -> (11, 0) projected
  line L4 (-11, 10) -> (-11, 0) projected
  point P0 (0, 10)
  point P1 (0, 5)
  dimension "d94" = 11
  dimension "d95" = 5
hole "Hole9" at (9.5263, 5.5, -5) direction (-0.866, -0.5, 0) diameter 3.242 depth 11.05 tip angle 118 thread size "M4x0.7" class "6H" standard "ANSI Metric M Profile"
sketch "Sketch18" plane through (-9.5263, 5.5, -10) normal (-0.866, 0.5, 0) x (-0.5, -0.866, 0)
  line L0 (11, 10) -> (11, 0) projected
  line L1 (35, 10) -> (-35, 10) projected
  line L2 (-11, 0) -> (11, 0) projected
  line L3 (-11, 10) -> (-11, 0) projected
  point P0 (0, 10)
  point P1 (0, 5)
  dimension "d103" = 5
  dimension "d104" = 11
hole "Hole10" at (-9.5263, 5.5, -5) direction (0.866, -0.5, 0) diameter 3.242 depth 11.05 tip angle 118 thread size "M4x0.7" class "6H" standard "ANSI Metric M Profile"
properties part number "P003" material "Aluminum 6061"
